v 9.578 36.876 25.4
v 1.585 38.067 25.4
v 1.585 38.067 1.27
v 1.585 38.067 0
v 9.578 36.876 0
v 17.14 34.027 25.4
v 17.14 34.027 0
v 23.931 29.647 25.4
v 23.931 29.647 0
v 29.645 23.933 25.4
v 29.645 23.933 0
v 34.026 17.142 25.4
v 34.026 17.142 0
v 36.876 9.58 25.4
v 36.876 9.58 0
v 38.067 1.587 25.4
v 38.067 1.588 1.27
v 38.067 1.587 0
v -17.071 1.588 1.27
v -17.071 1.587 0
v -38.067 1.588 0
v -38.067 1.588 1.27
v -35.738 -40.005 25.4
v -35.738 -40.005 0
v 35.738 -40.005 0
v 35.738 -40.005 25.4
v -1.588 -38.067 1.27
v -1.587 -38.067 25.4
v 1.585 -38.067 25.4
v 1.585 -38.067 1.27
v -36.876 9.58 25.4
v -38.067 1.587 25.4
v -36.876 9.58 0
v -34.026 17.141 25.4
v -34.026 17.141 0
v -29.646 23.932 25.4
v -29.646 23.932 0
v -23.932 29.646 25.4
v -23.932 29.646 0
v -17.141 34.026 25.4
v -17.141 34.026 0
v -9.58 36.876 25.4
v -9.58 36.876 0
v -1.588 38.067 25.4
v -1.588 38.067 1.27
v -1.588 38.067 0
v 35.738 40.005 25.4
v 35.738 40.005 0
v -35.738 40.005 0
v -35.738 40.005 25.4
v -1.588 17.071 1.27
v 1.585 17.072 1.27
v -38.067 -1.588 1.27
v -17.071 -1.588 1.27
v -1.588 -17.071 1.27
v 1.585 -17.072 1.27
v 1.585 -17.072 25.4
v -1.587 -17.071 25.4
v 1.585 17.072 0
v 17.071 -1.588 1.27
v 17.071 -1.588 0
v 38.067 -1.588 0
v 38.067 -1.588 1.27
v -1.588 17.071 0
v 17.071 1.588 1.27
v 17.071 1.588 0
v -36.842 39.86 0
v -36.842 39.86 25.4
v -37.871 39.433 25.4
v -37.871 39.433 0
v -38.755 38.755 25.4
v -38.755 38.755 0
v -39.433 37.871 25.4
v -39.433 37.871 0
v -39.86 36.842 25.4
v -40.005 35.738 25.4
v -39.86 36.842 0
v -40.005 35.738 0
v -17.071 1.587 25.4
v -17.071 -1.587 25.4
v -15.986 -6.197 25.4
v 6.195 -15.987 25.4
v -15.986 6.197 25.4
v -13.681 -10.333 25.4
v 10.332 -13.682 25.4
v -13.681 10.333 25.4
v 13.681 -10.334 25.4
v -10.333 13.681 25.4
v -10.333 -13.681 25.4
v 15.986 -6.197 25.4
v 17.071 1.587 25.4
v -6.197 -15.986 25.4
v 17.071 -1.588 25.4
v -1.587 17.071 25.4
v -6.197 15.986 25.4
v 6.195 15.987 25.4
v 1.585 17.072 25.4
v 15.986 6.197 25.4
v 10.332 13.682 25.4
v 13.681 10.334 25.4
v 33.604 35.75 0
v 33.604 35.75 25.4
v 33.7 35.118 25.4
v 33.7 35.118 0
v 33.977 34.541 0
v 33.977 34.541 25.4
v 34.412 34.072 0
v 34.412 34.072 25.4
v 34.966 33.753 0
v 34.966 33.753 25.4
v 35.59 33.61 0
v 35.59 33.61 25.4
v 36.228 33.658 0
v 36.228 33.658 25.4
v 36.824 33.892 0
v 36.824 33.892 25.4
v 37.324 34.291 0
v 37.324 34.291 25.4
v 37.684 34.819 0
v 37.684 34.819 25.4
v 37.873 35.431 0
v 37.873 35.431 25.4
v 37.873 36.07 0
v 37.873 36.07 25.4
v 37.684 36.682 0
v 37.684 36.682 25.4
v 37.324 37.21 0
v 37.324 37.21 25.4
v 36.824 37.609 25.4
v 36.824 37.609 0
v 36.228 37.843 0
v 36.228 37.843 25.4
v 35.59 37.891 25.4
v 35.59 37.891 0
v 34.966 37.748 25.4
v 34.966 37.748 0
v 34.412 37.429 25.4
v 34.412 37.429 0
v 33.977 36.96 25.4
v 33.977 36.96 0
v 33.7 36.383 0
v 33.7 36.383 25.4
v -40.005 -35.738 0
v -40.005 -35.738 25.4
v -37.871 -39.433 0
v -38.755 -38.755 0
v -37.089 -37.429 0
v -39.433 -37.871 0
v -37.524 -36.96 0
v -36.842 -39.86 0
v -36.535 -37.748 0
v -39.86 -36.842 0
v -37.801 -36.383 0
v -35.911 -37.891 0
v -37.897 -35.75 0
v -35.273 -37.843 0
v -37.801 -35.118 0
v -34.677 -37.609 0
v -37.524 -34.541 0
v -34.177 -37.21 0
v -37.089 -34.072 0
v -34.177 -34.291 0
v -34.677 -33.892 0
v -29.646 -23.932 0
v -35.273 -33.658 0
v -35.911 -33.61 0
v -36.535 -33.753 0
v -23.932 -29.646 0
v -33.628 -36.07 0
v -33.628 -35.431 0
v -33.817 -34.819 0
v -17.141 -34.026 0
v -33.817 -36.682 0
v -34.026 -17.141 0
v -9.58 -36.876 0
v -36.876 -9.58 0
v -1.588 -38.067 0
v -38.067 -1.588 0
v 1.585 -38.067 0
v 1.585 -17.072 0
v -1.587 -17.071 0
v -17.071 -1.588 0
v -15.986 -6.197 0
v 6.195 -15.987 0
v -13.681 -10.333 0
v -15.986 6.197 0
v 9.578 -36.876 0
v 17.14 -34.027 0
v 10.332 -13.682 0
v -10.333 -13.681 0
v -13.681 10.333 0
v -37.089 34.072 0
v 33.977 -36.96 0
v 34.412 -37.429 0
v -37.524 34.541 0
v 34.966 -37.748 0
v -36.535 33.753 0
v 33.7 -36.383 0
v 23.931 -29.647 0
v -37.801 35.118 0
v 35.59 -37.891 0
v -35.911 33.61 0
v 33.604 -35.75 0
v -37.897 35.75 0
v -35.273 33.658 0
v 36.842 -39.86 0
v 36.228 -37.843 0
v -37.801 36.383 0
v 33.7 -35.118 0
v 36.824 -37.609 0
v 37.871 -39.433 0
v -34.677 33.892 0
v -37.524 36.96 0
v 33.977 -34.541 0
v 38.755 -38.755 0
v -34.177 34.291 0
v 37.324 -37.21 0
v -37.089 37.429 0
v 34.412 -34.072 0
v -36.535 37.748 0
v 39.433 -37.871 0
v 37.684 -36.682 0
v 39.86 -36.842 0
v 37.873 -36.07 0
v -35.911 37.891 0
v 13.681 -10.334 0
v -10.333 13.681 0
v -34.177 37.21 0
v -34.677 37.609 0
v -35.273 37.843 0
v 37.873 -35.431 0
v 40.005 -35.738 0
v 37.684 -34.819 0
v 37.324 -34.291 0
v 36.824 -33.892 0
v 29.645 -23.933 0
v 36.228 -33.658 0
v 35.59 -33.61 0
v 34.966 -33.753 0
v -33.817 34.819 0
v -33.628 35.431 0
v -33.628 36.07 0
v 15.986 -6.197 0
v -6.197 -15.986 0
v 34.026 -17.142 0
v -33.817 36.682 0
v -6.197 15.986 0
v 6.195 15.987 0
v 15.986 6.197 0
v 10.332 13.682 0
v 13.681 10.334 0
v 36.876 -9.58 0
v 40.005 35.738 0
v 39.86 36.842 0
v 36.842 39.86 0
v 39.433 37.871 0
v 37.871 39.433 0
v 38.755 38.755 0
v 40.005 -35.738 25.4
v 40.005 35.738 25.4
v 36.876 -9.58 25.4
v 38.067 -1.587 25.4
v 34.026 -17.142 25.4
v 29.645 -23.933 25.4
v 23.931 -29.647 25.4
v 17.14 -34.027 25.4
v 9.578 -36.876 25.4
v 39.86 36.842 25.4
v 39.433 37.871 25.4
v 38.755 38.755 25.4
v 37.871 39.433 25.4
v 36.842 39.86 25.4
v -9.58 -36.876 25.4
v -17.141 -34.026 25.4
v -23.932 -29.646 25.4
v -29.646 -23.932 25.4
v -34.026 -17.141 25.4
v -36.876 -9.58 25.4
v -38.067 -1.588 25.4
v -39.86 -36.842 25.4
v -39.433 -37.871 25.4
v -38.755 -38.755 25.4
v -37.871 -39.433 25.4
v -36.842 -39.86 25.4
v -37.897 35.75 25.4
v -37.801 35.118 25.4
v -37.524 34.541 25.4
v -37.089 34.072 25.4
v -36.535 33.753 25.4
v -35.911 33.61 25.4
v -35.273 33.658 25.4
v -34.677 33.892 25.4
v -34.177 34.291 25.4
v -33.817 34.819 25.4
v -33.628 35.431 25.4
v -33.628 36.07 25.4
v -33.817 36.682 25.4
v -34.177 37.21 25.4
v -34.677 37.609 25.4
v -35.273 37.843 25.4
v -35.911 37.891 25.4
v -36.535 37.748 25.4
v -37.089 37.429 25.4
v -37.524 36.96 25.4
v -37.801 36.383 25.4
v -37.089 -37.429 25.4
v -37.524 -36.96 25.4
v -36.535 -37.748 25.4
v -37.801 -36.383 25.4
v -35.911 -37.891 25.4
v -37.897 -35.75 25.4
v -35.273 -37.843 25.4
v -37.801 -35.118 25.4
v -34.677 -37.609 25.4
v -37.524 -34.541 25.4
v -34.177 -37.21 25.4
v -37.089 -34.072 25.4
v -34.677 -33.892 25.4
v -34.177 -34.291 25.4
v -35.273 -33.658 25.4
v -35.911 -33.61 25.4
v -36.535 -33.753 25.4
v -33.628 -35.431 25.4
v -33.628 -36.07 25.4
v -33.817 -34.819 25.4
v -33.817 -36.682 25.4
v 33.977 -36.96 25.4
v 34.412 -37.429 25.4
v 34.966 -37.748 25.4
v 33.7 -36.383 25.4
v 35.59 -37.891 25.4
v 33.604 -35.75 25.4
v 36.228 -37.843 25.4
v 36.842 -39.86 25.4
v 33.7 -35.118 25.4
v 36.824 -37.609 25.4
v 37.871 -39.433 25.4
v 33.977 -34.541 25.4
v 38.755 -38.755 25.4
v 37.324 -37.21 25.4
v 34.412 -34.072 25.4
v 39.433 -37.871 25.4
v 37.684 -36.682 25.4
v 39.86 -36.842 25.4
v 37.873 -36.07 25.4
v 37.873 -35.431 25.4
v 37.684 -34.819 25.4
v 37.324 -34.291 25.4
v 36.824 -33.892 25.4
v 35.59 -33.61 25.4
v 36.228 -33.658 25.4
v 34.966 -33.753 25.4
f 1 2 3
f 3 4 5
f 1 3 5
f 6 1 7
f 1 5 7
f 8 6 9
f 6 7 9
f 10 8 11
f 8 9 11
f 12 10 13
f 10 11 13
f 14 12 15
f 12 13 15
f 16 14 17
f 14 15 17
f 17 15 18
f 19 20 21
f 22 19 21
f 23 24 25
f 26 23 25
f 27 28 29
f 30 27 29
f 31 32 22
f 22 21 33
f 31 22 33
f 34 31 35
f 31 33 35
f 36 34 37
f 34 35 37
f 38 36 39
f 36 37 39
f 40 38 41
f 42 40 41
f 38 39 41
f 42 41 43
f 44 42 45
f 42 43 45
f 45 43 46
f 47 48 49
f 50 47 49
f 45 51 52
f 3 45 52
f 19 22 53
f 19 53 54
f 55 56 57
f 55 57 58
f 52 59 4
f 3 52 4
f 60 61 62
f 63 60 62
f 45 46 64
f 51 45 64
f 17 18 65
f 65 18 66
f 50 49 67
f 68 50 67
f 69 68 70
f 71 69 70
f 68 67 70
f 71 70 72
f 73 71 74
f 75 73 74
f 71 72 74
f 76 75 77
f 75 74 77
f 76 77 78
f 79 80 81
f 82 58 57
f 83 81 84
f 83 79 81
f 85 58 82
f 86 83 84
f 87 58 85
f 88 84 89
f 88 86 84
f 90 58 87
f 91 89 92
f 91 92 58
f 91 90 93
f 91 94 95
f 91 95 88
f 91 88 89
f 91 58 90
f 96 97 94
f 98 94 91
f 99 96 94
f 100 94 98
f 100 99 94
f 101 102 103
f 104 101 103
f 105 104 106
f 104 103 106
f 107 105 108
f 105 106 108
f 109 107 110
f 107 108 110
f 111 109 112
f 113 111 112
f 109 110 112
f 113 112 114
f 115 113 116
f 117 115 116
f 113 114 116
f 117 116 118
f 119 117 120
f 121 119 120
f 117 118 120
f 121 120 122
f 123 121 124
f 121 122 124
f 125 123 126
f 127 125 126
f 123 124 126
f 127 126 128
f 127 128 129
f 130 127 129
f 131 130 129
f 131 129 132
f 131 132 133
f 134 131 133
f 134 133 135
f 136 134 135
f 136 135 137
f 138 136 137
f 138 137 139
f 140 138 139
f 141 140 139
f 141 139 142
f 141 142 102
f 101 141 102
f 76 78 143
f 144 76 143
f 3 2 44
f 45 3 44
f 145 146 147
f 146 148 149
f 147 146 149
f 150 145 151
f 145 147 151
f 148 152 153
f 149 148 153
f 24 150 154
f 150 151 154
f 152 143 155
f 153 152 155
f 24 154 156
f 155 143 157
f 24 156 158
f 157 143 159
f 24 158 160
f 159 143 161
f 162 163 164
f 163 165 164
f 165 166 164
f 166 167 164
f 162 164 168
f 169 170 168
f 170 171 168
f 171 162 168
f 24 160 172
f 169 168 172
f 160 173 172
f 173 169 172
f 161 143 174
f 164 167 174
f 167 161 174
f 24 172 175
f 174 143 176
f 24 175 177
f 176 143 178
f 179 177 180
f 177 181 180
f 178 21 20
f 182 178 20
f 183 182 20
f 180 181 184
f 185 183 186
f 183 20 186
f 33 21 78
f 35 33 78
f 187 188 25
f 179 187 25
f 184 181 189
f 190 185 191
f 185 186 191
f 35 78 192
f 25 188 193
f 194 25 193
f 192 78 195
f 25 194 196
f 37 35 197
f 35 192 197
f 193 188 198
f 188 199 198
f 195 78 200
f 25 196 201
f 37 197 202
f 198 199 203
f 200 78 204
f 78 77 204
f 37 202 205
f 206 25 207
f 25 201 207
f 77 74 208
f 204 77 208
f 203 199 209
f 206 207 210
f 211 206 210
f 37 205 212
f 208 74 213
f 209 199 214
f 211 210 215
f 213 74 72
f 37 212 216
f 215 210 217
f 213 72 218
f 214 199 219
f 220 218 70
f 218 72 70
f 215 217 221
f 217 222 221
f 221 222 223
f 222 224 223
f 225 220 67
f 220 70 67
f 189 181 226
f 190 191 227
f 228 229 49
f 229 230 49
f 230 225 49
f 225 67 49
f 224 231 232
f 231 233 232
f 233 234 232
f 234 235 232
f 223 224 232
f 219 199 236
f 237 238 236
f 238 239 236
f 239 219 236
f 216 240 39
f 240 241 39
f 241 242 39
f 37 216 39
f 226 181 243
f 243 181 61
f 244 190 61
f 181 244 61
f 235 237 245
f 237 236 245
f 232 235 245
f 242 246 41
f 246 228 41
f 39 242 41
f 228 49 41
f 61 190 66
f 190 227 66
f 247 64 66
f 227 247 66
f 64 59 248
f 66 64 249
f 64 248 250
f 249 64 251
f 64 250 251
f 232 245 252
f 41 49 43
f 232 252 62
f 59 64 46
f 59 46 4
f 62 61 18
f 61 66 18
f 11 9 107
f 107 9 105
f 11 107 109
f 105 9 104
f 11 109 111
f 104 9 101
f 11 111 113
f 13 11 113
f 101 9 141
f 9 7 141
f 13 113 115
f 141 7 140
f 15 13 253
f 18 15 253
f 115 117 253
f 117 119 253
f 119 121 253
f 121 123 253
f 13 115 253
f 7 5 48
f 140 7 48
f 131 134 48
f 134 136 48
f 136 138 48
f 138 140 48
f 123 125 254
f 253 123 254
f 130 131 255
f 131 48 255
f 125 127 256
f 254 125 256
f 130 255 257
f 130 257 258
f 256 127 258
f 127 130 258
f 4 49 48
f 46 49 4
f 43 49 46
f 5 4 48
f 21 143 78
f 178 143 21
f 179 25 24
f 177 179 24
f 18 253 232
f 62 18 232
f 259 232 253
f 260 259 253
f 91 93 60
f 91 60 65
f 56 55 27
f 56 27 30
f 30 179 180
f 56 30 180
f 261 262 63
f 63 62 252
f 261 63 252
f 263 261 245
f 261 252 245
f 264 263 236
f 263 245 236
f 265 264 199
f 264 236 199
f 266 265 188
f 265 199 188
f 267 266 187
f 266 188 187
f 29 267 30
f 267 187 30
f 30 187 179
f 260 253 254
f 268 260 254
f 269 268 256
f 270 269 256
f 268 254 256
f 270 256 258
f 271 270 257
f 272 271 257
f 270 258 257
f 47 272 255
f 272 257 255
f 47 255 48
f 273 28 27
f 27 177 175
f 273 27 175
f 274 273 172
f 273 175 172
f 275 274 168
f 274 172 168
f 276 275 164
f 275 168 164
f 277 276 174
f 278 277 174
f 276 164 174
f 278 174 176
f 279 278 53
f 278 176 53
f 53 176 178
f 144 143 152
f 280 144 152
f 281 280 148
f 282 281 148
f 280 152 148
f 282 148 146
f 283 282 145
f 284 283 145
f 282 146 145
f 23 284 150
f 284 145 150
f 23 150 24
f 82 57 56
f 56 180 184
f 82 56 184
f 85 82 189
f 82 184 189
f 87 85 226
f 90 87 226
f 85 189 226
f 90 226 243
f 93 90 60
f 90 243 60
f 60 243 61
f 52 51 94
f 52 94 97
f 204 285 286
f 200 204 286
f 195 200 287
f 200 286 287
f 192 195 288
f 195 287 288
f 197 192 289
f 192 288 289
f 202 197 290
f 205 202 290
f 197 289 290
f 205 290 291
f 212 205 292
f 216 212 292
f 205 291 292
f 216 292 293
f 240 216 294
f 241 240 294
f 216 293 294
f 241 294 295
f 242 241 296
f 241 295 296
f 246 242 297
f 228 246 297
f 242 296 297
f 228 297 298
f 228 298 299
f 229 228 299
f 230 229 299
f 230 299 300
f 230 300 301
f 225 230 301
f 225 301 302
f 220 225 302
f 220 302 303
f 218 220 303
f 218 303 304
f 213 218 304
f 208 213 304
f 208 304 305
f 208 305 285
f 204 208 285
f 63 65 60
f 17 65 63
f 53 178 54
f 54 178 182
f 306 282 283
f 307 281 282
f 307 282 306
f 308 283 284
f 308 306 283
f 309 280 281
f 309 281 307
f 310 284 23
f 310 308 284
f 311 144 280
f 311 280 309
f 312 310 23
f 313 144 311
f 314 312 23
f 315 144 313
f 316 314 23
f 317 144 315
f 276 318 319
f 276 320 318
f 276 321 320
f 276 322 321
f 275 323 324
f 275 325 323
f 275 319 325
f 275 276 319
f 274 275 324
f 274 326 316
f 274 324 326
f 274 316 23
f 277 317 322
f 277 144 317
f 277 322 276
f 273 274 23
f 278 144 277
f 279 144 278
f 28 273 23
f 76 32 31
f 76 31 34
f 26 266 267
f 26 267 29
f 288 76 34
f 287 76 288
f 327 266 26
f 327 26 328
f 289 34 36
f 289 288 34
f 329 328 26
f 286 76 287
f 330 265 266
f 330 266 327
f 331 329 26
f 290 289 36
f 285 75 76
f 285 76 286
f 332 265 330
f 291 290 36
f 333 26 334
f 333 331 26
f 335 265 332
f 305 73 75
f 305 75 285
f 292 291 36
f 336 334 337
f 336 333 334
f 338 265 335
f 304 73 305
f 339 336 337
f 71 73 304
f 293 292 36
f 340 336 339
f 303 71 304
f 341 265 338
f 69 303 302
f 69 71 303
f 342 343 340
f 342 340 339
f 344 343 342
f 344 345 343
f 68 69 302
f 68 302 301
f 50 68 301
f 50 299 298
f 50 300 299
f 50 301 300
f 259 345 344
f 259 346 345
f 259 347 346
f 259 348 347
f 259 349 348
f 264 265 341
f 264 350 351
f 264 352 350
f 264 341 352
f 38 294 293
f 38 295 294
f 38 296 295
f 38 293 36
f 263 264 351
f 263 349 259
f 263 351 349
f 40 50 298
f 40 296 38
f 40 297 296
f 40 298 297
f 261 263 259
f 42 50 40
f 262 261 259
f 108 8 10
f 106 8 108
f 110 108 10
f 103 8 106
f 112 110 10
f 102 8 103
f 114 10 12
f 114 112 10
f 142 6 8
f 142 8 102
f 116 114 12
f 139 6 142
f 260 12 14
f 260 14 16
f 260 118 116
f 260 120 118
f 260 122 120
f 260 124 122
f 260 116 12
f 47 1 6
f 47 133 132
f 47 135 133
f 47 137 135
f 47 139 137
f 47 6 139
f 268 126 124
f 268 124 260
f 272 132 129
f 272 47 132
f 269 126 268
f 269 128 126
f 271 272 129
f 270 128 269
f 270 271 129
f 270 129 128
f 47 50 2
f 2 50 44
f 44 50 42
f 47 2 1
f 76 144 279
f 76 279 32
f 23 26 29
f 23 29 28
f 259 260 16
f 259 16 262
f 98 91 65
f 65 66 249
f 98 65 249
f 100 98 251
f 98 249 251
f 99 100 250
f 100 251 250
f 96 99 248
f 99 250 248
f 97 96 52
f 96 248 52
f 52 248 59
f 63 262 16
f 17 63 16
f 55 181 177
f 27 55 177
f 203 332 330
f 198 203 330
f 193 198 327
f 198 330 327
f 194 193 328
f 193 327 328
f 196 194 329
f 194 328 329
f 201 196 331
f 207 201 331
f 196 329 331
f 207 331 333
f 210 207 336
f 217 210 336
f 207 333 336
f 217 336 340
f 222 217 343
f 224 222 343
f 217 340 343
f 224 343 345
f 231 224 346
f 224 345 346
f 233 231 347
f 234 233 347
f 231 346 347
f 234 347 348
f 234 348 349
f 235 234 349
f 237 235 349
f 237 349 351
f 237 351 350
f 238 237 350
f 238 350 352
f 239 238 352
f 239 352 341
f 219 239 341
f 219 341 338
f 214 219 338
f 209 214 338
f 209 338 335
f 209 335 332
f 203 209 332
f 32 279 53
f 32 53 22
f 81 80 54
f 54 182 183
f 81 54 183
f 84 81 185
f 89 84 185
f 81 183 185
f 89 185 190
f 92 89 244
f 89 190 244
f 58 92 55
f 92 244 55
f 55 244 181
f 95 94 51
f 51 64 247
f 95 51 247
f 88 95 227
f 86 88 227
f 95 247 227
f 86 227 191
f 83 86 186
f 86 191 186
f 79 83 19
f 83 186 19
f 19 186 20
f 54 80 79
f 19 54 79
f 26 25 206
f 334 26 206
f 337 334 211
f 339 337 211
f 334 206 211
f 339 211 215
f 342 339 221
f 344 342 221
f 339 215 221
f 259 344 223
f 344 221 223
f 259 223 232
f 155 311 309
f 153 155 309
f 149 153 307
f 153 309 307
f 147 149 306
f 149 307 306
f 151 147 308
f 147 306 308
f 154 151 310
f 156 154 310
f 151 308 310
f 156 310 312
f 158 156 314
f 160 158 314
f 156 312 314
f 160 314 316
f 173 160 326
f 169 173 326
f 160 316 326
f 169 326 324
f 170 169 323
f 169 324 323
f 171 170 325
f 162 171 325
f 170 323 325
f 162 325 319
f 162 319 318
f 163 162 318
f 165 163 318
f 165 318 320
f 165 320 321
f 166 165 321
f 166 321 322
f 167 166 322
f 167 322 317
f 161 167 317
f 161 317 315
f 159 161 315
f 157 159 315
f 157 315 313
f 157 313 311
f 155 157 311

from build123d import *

# Parameters (mm, degrees)
F1_DEPTH = 25.4
F2_D     = 4.2926
F3_W     = 20.9955662917
F3_H     = 3.175
F4_DEPTH = 24.13


with BuildPart() as f1:
    # F0 (on Top) → F1 (new body)
    with BuildSketch(Plane.XY):
        with BuildLine():
            Line((35.7378, 40.005), (-35.7378, 40.005))
            ThreePointArc((-35.7378, 40.005), (-38.7551660567, 38.7551660567), (-40.005, 35.7378))
            Line((-40.005, 35.7378), (-40.005, -35.7378))
            ThreePointArc((-40.005, -35.7378), (-38.7551660567, -38.7551660567), (-35.7378, -40.005))
            Line((-35.7378, -40.005), (35.7378, -40.005))
            ThreePointArc((35.7378, -40.005), (38.7551660567, -38.7551660567), (40.005, -35.7378))
            Line((40.005, -35.7378), (40.005, 35.7378))
            ThreePointArc((40.005, 35.7378), (38.7551660567, 38.7551660567), (35.7378, 40.005))
        make_face()
        with BuildLine():
            ThreePointArc((-1.5875, -38.0669127163), (-26.9407683632, -26.9407683632), (-38.0669127163, -1.5875))
            Line((-38.0669127163, -1.5875), (-17.0713464246, -1.5875))
            ThreePointArc((-17.0713464246, -1.5875), (-12.1233457634, -12.1233457634), (-1.5875, -17.0713464246))
            Line((-1.5875, -17.0713464246), (-1.5875, -38.0669127163))
        make_face(mode=Mode.SUBTRACT)
        with BuildLine():
            ThreePointArc((1.5849706368, -17.0715814464), (12.1224476132, -12.1242438472), (17.0713464246, -1.5875))
            Line((17.0713464246, -1.5875), (38.0669127163, -1.5875))
            ThreePointArc((38.0669127163, -1.5875), (26.9398733074, -26.9416633893), (1.5849706368, -38.0670181139))
            Line((1.5849706368, -38.0670181139), (1.5849706368, -17.0715814464))
        make_face(mode=Mode.SUBTRACT)
        with BuildLine():
            Line((-17.0713464246, 1.5875), (-38.0669127163, 1.5875))
            ThreePointArc((-38.0669127163, 1.5875), (-26.9407683632, 26.9407683632), (-1.5875, 38.0669127163))
            Line((-1.5875, 38.0669127163), (-1.5875, 17.0713464246))
            ThreePointArc((-1.5875, 17.0713464246), (-12.1233457634, 12.1233457634), (-17.0713464246, 1.5875))
        make_face(mode=Mode.SUBTRACT)
        with BuildLine():
            Line((38.0669127163, 1.5875), (17.0713464246, 1.5875))
            ThreePointArc((17.0713464246, 1.5875), (12.1224476132, 12.1242438472), (1.5849706368, 17.0715814464))
            Line((1.5849706368, 17.0715814464), (1.5849706368, 38.0670181139))
            ThreePointArc((1.5849706368, 38.0670181139), (26.9398733074, 26.9416633893), (38.0669127163, 1.5875))
        make_face(mode=Mode.SUBTRACT)
    extrude(amount=F1_DEPTH)

    # F2 (through all)
    with Locations(Plane(origin=(0, 0, 0), x_dir=(1, 0, 0), z_dir=(0, 0, -1))):
        with Locations((-35.7505, -35.7505), (35.7505, -35.7505), (35.7505, 35.7505), (-35.7505, 35.7505)):
            Hole(F2_D / 2)

    # F3 (on face) → F4 (cut)
    with BuildSketch(Plane.XY.offset(25.4)):
        with Locations((-27.5691295705, 0)):
            Rectangle(F3_W, F3_H)
        Polygon((1.5849706368, 38.0670181139), (-1.5875, 38.0669127163), (-1.5875, 17.0713464246), (1.5849706368, 17.0715814464), align=None)
        with Locations((27.5691295705, 0)):
            Rectangle(F3_W, F3_H)
        Polygon((1.5849706368, -38.0670181139), (1.5849706368, -17.0715814464), (-1.5875, -17.0713464246), (-1.5875, -38.0669127163), align=None)
    extrude(amount=-F4_DEPTH, mode=Mode.SUBTRACT)


solid = f1.part
